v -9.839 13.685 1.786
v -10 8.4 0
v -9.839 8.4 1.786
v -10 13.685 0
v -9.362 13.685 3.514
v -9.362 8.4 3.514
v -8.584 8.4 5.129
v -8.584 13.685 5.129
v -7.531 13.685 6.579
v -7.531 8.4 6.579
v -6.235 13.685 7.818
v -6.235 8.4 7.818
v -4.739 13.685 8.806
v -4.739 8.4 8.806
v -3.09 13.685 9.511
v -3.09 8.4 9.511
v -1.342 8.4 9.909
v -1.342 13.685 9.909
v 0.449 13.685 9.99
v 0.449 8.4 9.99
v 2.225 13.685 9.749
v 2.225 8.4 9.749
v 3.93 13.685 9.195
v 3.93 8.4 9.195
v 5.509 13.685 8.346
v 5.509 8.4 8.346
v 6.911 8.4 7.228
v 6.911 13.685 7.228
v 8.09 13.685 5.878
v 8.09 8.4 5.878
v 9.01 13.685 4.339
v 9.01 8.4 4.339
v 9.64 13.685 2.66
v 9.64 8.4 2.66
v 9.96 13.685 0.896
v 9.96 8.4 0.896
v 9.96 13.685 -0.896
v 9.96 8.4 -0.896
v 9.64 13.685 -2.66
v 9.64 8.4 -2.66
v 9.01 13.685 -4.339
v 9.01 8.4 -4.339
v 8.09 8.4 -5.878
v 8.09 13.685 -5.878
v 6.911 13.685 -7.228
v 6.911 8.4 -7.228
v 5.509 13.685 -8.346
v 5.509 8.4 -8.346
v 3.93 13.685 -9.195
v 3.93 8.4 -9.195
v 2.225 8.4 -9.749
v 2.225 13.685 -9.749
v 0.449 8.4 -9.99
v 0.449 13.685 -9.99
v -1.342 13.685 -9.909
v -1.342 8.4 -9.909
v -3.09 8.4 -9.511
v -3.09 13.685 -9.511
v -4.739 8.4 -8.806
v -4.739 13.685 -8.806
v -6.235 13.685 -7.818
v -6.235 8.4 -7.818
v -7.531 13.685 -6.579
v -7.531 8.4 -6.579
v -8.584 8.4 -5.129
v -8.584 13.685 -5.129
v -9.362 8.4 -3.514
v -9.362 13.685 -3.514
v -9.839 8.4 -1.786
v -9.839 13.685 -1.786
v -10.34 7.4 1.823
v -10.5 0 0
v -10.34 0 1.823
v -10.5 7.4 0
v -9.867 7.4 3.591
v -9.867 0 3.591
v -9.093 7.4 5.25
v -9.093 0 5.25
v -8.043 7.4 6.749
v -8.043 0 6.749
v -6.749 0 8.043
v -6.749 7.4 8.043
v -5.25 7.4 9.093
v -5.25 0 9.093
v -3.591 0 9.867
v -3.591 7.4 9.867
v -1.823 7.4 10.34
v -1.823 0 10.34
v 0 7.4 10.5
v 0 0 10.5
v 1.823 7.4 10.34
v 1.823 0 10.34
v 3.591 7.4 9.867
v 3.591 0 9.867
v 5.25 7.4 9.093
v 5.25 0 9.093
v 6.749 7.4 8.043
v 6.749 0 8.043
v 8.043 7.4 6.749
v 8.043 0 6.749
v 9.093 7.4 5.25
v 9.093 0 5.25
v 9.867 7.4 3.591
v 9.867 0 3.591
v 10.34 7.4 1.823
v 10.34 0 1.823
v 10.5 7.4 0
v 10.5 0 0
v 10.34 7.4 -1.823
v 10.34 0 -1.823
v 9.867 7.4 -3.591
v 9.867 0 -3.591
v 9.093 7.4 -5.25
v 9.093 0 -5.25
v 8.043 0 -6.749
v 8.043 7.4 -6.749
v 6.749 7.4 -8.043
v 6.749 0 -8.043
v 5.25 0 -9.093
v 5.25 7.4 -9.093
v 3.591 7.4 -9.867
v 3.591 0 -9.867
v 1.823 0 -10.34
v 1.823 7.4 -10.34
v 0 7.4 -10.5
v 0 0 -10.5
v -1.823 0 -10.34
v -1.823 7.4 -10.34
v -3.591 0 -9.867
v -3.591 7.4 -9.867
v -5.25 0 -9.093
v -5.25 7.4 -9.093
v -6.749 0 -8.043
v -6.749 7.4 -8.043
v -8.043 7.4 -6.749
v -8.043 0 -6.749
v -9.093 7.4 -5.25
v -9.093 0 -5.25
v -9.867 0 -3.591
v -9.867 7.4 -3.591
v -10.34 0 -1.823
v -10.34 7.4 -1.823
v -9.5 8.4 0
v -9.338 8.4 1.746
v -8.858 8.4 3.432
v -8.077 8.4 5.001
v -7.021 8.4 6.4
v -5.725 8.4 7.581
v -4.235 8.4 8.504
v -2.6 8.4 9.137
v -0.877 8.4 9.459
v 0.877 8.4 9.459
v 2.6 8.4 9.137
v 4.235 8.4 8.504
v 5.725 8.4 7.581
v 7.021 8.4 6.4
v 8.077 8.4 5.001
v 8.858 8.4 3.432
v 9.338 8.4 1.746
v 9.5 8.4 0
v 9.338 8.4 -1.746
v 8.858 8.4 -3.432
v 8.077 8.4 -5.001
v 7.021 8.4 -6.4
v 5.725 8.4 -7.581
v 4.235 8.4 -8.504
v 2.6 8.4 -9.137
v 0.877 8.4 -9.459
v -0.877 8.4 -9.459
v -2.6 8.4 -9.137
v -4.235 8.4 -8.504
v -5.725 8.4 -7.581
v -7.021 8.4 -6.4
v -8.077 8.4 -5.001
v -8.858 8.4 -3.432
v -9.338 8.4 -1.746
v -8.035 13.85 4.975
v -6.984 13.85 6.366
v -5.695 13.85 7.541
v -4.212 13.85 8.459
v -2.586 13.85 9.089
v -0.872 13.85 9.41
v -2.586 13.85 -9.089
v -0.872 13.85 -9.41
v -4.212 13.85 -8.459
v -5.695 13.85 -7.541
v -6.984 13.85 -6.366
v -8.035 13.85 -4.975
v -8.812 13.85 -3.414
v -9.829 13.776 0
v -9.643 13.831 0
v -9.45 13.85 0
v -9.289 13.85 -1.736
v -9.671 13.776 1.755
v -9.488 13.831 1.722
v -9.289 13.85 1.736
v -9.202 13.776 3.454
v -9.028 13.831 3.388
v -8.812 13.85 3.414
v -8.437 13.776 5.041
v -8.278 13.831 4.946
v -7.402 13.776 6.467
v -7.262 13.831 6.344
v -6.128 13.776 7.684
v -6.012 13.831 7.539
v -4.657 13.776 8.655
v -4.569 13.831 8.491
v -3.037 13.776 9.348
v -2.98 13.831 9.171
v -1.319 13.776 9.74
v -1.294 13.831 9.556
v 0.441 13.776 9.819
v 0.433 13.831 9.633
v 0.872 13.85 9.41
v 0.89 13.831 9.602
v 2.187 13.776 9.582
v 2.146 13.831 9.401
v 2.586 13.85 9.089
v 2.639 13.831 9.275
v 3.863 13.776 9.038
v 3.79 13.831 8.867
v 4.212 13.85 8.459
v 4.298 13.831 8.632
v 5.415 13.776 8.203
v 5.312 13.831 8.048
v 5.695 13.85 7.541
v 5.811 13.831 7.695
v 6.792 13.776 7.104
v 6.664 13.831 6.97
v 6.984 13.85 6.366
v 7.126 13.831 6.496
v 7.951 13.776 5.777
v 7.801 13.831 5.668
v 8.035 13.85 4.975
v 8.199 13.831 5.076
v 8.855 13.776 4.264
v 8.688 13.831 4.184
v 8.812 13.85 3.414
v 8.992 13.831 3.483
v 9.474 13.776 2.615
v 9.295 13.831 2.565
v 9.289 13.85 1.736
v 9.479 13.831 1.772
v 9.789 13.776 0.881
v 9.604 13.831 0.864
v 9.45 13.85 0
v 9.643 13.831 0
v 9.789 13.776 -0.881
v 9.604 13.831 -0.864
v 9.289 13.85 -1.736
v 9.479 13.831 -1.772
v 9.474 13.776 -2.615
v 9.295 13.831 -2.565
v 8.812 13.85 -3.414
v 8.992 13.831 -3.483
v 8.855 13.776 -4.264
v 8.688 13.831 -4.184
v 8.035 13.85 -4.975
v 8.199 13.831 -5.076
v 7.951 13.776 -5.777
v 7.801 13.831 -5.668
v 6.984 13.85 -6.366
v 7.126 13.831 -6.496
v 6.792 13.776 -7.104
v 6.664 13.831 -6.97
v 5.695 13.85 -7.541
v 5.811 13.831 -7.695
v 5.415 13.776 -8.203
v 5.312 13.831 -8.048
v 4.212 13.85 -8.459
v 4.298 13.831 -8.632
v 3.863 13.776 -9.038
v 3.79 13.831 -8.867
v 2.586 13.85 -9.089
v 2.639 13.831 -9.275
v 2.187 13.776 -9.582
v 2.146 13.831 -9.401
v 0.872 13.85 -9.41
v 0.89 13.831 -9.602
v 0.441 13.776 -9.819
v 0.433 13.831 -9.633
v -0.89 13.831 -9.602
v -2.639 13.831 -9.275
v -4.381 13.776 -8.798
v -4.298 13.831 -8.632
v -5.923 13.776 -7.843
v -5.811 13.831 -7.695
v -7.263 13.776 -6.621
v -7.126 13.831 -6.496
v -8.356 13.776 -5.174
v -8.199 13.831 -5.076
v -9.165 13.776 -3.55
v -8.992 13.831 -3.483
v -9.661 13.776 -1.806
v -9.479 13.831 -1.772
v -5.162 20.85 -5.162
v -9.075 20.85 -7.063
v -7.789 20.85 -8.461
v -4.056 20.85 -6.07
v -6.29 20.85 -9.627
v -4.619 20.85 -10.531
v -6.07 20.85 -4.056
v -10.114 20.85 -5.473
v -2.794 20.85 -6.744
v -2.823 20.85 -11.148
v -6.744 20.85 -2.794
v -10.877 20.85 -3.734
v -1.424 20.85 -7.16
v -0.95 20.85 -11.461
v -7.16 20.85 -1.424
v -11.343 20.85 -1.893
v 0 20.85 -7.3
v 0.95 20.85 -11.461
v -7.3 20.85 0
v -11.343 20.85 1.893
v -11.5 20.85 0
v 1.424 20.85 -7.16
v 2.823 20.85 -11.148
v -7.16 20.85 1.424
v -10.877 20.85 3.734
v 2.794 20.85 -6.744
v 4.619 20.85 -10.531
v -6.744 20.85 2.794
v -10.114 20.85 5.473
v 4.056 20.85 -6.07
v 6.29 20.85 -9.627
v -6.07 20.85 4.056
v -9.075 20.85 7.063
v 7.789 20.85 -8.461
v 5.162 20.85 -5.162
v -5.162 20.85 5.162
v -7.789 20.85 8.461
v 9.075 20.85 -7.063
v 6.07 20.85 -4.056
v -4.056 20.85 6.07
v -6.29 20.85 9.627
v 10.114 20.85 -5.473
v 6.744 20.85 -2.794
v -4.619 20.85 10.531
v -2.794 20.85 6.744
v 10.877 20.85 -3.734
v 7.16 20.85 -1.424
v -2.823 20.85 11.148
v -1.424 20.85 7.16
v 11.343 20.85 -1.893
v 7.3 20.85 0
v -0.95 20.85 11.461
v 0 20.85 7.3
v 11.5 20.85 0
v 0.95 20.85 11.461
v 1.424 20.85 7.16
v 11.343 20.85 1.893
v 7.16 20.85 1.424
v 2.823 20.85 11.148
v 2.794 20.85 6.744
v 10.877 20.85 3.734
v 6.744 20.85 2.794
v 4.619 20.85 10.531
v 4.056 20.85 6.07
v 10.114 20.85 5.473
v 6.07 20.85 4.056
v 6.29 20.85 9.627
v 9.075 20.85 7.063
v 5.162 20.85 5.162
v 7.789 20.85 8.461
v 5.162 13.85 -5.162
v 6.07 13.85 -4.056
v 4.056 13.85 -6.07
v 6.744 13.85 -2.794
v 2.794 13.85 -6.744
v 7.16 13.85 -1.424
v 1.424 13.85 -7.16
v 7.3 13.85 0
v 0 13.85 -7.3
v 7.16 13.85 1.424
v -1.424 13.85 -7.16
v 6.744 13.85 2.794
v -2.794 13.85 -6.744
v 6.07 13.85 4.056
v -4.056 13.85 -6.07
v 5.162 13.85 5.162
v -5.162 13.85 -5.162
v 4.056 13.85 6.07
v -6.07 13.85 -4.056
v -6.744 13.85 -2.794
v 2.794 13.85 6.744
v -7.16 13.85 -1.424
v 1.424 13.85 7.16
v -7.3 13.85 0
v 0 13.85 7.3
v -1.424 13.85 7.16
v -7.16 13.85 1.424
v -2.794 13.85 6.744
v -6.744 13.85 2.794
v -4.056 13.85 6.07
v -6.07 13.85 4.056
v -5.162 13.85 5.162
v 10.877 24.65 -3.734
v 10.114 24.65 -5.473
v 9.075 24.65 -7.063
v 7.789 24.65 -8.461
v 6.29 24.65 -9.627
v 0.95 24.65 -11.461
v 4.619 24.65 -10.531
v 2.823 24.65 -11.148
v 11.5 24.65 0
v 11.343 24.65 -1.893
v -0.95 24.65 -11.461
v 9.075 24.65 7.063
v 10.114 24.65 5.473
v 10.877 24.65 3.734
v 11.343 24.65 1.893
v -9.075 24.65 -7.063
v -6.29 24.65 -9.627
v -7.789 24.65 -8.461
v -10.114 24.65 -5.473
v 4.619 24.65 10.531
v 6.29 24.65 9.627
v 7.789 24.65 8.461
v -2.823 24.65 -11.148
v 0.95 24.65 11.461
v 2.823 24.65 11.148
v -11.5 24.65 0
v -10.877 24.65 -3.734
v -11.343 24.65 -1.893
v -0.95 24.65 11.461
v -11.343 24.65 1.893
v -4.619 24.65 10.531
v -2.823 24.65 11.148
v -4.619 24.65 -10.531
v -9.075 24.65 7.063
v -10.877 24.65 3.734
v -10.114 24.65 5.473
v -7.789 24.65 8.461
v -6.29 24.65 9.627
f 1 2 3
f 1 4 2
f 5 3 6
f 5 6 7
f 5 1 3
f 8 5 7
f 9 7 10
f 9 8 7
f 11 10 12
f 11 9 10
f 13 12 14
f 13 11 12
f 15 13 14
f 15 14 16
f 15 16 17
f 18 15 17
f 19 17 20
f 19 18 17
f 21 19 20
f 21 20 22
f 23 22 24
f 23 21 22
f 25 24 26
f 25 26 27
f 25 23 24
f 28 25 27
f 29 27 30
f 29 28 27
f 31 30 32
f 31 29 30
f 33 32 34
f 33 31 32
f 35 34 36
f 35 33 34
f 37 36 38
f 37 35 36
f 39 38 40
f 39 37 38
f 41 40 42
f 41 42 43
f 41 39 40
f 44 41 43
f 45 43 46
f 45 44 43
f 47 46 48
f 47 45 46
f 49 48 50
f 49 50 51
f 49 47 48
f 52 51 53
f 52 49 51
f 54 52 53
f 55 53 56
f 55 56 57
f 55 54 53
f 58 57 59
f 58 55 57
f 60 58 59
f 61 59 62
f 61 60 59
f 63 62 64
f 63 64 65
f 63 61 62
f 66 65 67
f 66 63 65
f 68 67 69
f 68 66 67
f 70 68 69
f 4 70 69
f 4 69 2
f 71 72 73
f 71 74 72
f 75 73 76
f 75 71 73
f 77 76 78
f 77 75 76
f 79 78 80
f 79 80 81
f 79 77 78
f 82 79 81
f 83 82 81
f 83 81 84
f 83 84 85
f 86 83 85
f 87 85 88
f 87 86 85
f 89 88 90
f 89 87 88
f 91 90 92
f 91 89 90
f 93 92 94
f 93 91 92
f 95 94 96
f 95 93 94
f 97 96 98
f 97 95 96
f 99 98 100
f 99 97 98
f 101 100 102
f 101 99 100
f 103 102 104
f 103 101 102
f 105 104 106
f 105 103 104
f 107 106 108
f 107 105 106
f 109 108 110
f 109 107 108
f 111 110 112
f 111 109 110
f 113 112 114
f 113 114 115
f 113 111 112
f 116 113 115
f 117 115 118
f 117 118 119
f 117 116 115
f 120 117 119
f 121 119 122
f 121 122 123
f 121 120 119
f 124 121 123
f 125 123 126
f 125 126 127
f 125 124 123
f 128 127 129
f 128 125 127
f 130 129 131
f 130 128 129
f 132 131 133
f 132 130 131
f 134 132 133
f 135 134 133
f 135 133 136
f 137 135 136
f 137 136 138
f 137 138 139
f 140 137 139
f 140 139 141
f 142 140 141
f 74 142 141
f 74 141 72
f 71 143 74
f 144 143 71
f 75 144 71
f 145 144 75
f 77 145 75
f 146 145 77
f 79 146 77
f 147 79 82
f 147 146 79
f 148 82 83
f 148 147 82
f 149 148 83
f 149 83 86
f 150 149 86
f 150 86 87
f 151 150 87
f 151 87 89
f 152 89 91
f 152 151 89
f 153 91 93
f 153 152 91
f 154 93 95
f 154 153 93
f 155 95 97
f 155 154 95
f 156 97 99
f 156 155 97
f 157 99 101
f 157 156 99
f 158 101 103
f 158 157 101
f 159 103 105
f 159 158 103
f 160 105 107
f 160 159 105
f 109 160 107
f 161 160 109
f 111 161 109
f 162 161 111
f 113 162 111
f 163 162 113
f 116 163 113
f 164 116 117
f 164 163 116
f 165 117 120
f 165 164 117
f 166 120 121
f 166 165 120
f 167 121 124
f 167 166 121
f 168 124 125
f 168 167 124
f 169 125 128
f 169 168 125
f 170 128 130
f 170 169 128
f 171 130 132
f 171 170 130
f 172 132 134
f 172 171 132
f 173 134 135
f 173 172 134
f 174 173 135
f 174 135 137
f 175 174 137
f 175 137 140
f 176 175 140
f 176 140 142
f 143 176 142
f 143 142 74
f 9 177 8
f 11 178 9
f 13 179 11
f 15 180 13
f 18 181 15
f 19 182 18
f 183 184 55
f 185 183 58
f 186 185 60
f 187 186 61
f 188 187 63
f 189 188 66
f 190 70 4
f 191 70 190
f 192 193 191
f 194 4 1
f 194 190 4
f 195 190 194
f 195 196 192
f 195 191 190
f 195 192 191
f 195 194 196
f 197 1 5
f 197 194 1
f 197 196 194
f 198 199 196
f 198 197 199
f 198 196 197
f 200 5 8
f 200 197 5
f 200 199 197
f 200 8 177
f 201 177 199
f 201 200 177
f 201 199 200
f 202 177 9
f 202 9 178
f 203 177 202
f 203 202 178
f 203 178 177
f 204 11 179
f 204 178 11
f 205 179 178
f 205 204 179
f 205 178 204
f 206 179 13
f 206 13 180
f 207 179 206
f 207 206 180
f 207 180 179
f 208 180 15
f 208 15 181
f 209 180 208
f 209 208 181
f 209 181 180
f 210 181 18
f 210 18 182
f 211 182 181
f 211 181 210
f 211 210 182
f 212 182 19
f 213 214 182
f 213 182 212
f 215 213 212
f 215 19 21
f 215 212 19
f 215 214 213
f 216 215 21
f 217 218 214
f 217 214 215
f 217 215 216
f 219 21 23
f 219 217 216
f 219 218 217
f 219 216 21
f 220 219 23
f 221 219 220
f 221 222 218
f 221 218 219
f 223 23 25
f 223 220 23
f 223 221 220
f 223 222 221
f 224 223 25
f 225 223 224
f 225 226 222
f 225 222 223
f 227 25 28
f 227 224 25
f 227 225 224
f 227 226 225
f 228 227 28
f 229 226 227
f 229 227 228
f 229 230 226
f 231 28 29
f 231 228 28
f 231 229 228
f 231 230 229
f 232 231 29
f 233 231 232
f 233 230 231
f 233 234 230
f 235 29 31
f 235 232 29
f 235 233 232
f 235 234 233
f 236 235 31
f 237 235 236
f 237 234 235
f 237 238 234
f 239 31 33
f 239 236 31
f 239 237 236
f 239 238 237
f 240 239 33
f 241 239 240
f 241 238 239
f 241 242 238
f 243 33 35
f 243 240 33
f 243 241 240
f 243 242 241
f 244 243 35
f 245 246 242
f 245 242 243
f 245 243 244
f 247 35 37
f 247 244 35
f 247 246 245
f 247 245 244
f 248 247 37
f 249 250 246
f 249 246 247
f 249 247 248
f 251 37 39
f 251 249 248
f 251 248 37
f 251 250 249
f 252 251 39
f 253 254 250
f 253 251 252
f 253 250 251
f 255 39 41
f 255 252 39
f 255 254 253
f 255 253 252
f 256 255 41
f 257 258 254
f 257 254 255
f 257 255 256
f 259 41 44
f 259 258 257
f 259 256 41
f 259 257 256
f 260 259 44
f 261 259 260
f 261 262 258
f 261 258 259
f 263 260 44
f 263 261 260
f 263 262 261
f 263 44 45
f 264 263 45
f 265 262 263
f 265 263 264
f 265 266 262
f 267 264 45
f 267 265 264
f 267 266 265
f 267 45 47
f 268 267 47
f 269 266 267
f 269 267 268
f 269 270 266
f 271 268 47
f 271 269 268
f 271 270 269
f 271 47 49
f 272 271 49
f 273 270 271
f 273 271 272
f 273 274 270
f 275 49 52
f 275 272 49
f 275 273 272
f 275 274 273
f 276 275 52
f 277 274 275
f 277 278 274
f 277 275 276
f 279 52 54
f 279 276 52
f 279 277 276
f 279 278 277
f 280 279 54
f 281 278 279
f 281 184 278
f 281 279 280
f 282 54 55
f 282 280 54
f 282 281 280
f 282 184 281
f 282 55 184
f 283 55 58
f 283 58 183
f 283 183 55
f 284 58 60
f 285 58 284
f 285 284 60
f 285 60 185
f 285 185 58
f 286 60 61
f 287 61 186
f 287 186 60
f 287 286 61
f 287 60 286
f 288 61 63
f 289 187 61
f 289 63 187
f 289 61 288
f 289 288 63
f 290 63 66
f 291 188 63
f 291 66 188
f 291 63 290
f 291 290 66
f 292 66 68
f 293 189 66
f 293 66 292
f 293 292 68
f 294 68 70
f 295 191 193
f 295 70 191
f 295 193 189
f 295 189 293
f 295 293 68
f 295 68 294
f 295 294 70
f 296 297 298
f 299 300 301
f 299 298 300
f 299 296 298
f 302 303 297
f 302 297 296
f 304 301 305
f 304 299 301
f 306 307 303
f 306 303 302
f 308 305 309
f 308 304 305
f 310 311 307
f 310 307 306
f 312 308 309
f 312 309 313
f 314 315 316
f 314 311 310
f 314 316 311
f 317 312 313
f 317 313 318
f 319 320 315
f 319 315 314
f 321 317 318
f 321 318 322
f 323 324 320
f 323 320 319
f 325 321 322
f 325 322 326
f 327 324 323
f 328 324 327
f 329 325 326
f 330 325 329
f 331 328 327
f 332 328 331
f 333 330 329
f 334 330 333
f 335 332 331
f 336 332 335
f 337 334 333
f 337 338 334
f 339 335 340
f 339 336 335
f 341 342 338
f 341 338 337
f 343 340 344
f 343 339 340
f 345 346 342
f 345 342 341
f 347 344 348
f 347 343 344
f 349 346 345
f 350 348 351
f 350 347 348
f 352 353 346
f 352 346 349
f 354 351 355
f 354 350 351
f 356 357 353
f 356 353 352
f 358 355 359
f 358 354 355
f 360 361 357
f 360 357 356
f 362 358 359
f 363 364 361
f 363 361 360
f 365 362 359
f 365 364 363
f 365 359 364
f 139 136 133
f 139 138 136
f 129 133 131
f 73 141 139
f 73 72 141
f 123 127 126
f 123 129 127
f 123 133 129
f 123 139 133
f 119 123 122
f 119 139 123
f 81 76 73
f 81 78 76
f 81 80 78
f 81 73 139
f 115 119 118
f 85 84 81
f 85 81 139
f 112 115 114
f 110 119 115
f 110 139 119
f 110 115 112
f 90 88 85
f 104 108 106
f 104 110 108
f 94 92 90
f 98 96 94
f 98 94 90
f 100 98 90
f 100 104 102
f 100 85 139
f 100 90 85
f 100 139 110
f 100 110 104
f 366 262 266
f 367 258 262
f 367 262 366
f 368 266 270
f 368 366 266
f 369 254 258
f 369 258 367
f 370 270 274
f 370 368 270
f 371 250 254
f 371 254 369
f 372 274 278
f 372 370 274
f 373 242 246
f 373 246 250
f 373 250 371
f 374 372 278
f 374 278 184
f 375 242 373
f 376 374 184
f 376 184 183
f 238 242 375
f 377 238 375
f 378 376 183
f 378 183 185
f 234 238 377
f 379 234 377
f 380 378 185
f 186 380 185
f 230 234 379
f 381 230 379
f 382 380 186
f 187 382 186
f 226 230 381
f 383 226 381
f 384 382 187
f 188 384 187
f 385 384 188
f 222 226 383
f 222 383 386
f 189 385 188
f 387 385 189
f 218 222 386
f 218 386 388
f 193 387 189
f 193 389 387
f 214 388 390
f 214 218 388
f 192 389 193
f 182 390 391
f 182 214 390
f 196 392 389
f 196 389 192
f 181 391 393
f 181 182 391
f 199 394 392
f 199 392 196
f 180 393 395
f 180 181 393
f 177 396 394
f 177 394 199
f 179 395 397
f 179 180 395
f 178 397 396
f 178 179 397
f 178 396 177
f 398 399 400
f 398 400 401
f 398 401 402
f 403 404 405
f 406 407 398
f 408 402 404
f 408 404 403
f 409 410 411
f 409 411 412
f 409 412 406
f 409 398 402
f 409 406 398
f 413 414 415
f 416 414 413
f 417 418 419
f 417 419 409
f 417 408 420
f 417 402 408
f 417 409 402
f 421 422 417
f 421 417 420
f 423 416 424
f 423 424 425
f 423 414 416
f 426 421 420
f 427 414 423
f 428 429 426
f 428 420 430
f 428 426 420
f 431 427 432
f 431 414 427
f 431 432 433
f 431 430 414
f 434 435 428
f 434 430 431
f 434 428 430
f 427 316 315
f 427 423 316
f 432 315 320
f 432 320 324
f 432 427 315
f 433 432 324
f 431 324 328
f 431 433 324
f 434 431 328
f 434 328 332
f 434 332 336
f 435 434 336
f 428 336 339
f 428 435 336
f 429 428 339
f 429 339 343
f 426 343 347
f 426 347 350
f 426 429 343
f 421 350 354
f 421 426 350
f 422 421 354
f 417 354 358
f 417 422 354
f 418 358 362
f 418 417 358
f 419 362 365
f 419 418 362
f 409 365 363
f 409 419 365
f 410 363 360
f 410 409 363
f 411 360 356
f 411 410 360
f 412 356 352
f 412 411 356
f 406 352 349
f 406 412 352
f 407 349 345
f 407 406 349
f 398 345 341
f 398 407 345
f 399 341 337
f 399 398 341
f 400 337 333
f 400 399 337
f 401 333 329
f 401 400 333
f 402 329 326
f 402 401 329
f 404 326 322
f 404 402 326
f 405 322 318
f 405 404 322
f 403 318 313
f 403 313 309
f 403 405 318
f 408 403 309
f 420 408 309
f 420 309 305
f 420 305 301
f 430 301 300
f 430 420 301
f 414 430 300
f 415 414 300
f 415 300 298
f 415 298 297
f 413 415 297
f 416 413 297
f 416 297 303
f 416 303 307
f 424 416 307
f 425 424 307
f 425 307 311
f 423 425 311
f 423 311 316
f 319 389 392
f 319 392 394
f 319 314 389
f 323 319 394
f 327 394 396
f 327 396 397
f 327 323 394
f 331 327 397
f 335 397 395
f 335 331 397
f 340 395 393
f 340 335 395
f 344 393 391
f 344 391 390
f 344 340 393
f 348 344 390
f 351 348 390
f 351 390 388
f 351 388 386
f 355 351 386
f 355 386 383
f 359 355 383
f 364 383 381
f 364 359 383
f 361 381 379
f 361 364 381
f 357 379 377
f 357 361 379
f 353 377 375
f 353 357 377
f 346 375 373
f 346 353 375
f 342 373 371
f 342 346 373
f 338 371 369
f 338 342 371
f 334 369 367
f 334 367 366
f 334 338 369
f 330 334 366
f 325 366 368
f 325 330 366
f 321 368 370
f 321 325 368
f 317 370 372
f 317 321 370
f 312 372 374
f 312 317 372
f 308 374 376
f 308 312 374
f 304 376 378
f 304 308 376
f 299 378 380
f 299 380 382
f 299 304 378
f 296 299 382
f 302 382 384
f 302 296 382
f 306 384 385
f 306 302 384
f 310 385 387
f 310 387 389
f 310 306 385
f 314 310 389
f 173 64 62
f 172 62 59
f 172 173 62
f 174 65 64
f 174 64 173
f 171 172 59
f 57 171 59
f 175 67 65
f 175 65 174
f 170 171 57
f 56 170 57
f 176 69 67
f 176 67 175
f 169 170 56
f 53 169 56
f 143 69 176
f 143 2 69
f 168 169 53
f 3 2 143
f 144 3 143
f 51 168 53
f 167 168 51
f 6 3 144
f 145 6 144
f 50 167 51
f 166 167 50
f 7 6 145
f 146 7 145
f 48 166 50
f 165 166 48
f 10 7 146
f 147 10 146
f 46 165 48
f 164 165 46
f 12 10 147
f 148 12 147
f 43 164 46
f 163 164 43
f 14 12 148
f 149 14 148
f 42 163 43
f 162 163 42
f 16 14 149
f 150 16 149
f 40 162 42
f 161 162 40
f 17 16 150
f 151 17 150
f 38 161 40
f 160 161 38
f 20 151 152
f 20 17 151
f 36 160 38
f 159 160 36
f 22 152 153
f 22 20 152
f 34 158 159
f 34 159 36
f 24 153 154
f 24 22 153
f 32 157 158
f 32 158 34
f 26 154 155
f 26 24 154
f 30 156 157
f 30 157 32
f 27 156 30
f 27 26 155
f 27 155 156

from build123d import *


with BuildPart() as part:
    # Sketch1 → Revolve1 (revolve)
    with BuildSketch(Plane.XY):
        with BuildLine():
            Line((0, 0), (-10.5, 0))
            Line((-10.5, 0), (-10.5, 7.4))
            Line((-10.5, 7.4), (-9.5, 8.4))
            Line((-9.5, 8.4), (-10, 8.4))
            Line((-10, 8.4), (-10, 13.685164654))
            ThreePointArc((-10, 13.685164654), (-9.737084783, 13.807905177), (-9.45, 13.85))
            Line((-9.45, 13.85), (-7.3, 13.85))
            Line((-7.3, 13.85), (-7.3, 20.85))
            Line((-7.3, 20.85), (-11.5, 20.85))
            Line((-11.5, 20.85), (-11.5, 24.65))
            Line((-11.5, 24.65), (0, 24.65))
            Line((0, 24.65), (0, 0))
        make_face()
    revolve(axis=Axis((0, 0, 0), (0, 1, 0)))


solid = part.part
